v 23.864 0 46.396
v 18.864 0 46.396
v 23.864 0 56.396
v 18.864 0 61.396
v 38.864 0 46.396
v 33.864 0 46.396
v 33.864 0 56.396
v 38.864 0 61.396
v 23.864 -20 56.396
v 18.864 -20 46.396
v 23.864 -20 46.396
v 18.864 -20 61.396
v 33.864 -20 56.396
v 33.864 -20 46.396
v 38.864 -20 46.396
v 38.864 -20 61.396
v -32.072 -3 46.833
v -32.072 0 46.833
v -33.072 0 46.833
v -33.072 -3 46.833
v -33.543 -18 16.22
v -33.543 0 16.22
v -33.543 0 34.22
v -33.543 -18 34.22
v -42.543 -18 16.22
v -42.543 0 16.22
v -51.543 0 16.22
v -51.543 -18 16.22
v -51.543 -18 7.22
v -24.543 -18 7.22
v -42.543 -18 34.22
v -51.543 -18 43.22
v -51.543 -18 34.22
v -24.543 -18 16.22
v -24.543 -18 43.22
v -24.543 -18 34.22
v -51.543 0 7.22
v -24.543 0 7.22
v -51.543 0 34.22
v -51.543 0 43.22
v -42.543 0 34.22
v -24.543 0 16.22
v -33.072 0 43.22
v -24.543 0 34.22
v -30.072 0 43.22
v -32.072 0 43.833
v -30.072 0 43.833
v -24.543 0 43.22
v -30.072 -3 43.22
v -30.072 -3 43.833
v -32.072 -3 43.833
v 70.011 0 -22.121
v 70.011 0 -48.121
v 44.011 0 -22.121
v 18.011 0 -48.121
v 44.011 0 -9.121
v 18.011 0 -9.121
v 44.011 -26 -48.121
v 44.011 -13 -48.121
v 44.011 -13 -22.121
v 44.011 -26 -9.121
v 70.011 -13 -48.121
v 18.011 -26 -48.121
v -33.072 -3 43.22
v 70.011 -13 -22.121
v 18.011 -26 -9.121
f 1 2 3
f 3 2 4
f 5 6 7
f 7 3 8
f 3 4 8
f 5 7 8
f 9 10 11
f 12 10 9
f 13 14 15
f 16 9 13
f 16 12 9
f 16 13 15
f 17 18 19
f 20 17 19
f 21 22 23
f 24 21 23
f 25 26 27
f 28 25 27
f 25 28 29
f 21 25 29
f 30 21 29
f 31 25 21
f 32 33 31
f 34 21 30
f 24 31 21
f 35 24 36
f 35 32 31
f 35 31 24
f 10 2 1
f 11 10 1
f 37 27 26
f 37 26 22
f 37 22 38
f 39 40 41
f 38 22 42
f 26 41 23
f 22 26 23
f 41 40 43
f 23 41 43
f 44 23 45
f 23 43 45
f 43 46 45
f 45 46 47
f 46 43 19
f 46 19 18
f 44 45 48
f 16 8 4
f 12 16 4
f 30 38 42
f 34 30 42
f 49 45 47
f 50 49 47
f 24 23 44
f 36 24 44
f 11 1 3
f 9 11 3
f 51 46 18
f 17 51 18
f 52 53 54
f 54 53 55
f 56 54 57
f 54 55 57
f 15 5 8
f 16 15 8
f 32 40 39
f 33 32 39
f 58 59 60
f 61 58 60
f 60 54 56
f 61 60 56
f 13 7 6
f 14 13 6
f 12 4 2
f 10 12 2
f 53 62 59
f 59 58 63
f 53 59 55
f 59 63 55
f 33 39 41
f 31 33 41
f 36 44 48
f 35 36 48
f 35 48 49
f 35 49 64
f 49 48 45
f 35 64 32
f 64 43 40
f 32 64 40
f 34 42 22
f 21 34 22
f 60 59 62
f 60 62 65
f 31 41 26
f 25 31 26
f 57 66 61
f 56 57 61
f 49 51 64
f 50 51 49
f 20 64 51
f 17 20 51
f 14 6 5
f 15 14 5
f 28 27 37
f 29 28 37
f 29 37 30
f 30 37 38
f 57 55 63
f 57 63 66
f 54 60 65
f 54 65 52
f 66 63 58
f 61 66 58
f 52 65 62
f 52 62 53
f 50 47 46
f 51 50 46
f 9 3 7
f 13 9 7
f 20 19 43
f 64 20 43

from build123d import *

# Parameters (mm, degrees)
F1_DEPTH = 3
F3_DEPTH = 20
F5_DEPTH = 18
F6_W     = 26
F6_H     = 39
F7_DEPTH = 26
F8_W     = 13
F8_H     = 26
F9_DEPTH = 26


with BuildPart() as f1:
    # F0 (on Front) → F1 (new body)
    with BuildSketch(Plane.XZ):
        Polygon((-32.071659, 46.83319), (-33.071659, 46.83319), (-33.071659, 42.83319), (-30.071659, 42.83319), (-30.071659, 43.83319), (-32.071659, 43.83319), align=None)
    extrude(amount=F1_DEPTH)

    # F4 (on Front) → F5 (join)
    with BuildSketch(Plane.XZ):
        Polygon((-24.5427, 43.220366), (-51.5427, 43.220366), (-51.5427, 34.220366), (-42.5427, 34.220366), (-42.5427, 16.220366), (-51.5427, 16.220366), (-51.5427, 7.220366), (-24.5427, 7.220366), (-24.5427, 16.220366), (-33.5427, 16.220366), (-33.5427, 34.220366), (-24.5427, 34.220366), align=None)
    extrude(amount=F5_DEPTH)


with BuildPart() as f3:
    # F2 (on Front) → F3 (new body)
    with BuildSketch(Plane.XZ):
        Polygon((18.863813, 61.395953), (18.863813, 46.395953), (23.863813, 46.395953), (23.863813, 56.395953), (33.863813, 56.395953), (33.863813, 46.395953), (38.863813, 46.395953), (38.863813, 61.395953), align=None)
    extrude(amount=F3_DEPTH)


with BuildPart() as f7:
    # F6 (on Front) → F7 (new body)
    with BuildSketch(Plane.XZ):
        with Locations((31.011138, -28.620553)):
            Rectangle(F6_W, F6_H)
    extrude(amount=F7_DEPTH)

    # F8 (on face) → F9 (join)
    with BuildSketch(Plane.YZ.offset(44.011138)):
        with Locations((-6.5, -35.120553)):
            Rectangle(F8_W, F8_H)
    extrude(amount=F9_DEPTH)


solid = Compound([f1.part, f3.part, f7.part])
